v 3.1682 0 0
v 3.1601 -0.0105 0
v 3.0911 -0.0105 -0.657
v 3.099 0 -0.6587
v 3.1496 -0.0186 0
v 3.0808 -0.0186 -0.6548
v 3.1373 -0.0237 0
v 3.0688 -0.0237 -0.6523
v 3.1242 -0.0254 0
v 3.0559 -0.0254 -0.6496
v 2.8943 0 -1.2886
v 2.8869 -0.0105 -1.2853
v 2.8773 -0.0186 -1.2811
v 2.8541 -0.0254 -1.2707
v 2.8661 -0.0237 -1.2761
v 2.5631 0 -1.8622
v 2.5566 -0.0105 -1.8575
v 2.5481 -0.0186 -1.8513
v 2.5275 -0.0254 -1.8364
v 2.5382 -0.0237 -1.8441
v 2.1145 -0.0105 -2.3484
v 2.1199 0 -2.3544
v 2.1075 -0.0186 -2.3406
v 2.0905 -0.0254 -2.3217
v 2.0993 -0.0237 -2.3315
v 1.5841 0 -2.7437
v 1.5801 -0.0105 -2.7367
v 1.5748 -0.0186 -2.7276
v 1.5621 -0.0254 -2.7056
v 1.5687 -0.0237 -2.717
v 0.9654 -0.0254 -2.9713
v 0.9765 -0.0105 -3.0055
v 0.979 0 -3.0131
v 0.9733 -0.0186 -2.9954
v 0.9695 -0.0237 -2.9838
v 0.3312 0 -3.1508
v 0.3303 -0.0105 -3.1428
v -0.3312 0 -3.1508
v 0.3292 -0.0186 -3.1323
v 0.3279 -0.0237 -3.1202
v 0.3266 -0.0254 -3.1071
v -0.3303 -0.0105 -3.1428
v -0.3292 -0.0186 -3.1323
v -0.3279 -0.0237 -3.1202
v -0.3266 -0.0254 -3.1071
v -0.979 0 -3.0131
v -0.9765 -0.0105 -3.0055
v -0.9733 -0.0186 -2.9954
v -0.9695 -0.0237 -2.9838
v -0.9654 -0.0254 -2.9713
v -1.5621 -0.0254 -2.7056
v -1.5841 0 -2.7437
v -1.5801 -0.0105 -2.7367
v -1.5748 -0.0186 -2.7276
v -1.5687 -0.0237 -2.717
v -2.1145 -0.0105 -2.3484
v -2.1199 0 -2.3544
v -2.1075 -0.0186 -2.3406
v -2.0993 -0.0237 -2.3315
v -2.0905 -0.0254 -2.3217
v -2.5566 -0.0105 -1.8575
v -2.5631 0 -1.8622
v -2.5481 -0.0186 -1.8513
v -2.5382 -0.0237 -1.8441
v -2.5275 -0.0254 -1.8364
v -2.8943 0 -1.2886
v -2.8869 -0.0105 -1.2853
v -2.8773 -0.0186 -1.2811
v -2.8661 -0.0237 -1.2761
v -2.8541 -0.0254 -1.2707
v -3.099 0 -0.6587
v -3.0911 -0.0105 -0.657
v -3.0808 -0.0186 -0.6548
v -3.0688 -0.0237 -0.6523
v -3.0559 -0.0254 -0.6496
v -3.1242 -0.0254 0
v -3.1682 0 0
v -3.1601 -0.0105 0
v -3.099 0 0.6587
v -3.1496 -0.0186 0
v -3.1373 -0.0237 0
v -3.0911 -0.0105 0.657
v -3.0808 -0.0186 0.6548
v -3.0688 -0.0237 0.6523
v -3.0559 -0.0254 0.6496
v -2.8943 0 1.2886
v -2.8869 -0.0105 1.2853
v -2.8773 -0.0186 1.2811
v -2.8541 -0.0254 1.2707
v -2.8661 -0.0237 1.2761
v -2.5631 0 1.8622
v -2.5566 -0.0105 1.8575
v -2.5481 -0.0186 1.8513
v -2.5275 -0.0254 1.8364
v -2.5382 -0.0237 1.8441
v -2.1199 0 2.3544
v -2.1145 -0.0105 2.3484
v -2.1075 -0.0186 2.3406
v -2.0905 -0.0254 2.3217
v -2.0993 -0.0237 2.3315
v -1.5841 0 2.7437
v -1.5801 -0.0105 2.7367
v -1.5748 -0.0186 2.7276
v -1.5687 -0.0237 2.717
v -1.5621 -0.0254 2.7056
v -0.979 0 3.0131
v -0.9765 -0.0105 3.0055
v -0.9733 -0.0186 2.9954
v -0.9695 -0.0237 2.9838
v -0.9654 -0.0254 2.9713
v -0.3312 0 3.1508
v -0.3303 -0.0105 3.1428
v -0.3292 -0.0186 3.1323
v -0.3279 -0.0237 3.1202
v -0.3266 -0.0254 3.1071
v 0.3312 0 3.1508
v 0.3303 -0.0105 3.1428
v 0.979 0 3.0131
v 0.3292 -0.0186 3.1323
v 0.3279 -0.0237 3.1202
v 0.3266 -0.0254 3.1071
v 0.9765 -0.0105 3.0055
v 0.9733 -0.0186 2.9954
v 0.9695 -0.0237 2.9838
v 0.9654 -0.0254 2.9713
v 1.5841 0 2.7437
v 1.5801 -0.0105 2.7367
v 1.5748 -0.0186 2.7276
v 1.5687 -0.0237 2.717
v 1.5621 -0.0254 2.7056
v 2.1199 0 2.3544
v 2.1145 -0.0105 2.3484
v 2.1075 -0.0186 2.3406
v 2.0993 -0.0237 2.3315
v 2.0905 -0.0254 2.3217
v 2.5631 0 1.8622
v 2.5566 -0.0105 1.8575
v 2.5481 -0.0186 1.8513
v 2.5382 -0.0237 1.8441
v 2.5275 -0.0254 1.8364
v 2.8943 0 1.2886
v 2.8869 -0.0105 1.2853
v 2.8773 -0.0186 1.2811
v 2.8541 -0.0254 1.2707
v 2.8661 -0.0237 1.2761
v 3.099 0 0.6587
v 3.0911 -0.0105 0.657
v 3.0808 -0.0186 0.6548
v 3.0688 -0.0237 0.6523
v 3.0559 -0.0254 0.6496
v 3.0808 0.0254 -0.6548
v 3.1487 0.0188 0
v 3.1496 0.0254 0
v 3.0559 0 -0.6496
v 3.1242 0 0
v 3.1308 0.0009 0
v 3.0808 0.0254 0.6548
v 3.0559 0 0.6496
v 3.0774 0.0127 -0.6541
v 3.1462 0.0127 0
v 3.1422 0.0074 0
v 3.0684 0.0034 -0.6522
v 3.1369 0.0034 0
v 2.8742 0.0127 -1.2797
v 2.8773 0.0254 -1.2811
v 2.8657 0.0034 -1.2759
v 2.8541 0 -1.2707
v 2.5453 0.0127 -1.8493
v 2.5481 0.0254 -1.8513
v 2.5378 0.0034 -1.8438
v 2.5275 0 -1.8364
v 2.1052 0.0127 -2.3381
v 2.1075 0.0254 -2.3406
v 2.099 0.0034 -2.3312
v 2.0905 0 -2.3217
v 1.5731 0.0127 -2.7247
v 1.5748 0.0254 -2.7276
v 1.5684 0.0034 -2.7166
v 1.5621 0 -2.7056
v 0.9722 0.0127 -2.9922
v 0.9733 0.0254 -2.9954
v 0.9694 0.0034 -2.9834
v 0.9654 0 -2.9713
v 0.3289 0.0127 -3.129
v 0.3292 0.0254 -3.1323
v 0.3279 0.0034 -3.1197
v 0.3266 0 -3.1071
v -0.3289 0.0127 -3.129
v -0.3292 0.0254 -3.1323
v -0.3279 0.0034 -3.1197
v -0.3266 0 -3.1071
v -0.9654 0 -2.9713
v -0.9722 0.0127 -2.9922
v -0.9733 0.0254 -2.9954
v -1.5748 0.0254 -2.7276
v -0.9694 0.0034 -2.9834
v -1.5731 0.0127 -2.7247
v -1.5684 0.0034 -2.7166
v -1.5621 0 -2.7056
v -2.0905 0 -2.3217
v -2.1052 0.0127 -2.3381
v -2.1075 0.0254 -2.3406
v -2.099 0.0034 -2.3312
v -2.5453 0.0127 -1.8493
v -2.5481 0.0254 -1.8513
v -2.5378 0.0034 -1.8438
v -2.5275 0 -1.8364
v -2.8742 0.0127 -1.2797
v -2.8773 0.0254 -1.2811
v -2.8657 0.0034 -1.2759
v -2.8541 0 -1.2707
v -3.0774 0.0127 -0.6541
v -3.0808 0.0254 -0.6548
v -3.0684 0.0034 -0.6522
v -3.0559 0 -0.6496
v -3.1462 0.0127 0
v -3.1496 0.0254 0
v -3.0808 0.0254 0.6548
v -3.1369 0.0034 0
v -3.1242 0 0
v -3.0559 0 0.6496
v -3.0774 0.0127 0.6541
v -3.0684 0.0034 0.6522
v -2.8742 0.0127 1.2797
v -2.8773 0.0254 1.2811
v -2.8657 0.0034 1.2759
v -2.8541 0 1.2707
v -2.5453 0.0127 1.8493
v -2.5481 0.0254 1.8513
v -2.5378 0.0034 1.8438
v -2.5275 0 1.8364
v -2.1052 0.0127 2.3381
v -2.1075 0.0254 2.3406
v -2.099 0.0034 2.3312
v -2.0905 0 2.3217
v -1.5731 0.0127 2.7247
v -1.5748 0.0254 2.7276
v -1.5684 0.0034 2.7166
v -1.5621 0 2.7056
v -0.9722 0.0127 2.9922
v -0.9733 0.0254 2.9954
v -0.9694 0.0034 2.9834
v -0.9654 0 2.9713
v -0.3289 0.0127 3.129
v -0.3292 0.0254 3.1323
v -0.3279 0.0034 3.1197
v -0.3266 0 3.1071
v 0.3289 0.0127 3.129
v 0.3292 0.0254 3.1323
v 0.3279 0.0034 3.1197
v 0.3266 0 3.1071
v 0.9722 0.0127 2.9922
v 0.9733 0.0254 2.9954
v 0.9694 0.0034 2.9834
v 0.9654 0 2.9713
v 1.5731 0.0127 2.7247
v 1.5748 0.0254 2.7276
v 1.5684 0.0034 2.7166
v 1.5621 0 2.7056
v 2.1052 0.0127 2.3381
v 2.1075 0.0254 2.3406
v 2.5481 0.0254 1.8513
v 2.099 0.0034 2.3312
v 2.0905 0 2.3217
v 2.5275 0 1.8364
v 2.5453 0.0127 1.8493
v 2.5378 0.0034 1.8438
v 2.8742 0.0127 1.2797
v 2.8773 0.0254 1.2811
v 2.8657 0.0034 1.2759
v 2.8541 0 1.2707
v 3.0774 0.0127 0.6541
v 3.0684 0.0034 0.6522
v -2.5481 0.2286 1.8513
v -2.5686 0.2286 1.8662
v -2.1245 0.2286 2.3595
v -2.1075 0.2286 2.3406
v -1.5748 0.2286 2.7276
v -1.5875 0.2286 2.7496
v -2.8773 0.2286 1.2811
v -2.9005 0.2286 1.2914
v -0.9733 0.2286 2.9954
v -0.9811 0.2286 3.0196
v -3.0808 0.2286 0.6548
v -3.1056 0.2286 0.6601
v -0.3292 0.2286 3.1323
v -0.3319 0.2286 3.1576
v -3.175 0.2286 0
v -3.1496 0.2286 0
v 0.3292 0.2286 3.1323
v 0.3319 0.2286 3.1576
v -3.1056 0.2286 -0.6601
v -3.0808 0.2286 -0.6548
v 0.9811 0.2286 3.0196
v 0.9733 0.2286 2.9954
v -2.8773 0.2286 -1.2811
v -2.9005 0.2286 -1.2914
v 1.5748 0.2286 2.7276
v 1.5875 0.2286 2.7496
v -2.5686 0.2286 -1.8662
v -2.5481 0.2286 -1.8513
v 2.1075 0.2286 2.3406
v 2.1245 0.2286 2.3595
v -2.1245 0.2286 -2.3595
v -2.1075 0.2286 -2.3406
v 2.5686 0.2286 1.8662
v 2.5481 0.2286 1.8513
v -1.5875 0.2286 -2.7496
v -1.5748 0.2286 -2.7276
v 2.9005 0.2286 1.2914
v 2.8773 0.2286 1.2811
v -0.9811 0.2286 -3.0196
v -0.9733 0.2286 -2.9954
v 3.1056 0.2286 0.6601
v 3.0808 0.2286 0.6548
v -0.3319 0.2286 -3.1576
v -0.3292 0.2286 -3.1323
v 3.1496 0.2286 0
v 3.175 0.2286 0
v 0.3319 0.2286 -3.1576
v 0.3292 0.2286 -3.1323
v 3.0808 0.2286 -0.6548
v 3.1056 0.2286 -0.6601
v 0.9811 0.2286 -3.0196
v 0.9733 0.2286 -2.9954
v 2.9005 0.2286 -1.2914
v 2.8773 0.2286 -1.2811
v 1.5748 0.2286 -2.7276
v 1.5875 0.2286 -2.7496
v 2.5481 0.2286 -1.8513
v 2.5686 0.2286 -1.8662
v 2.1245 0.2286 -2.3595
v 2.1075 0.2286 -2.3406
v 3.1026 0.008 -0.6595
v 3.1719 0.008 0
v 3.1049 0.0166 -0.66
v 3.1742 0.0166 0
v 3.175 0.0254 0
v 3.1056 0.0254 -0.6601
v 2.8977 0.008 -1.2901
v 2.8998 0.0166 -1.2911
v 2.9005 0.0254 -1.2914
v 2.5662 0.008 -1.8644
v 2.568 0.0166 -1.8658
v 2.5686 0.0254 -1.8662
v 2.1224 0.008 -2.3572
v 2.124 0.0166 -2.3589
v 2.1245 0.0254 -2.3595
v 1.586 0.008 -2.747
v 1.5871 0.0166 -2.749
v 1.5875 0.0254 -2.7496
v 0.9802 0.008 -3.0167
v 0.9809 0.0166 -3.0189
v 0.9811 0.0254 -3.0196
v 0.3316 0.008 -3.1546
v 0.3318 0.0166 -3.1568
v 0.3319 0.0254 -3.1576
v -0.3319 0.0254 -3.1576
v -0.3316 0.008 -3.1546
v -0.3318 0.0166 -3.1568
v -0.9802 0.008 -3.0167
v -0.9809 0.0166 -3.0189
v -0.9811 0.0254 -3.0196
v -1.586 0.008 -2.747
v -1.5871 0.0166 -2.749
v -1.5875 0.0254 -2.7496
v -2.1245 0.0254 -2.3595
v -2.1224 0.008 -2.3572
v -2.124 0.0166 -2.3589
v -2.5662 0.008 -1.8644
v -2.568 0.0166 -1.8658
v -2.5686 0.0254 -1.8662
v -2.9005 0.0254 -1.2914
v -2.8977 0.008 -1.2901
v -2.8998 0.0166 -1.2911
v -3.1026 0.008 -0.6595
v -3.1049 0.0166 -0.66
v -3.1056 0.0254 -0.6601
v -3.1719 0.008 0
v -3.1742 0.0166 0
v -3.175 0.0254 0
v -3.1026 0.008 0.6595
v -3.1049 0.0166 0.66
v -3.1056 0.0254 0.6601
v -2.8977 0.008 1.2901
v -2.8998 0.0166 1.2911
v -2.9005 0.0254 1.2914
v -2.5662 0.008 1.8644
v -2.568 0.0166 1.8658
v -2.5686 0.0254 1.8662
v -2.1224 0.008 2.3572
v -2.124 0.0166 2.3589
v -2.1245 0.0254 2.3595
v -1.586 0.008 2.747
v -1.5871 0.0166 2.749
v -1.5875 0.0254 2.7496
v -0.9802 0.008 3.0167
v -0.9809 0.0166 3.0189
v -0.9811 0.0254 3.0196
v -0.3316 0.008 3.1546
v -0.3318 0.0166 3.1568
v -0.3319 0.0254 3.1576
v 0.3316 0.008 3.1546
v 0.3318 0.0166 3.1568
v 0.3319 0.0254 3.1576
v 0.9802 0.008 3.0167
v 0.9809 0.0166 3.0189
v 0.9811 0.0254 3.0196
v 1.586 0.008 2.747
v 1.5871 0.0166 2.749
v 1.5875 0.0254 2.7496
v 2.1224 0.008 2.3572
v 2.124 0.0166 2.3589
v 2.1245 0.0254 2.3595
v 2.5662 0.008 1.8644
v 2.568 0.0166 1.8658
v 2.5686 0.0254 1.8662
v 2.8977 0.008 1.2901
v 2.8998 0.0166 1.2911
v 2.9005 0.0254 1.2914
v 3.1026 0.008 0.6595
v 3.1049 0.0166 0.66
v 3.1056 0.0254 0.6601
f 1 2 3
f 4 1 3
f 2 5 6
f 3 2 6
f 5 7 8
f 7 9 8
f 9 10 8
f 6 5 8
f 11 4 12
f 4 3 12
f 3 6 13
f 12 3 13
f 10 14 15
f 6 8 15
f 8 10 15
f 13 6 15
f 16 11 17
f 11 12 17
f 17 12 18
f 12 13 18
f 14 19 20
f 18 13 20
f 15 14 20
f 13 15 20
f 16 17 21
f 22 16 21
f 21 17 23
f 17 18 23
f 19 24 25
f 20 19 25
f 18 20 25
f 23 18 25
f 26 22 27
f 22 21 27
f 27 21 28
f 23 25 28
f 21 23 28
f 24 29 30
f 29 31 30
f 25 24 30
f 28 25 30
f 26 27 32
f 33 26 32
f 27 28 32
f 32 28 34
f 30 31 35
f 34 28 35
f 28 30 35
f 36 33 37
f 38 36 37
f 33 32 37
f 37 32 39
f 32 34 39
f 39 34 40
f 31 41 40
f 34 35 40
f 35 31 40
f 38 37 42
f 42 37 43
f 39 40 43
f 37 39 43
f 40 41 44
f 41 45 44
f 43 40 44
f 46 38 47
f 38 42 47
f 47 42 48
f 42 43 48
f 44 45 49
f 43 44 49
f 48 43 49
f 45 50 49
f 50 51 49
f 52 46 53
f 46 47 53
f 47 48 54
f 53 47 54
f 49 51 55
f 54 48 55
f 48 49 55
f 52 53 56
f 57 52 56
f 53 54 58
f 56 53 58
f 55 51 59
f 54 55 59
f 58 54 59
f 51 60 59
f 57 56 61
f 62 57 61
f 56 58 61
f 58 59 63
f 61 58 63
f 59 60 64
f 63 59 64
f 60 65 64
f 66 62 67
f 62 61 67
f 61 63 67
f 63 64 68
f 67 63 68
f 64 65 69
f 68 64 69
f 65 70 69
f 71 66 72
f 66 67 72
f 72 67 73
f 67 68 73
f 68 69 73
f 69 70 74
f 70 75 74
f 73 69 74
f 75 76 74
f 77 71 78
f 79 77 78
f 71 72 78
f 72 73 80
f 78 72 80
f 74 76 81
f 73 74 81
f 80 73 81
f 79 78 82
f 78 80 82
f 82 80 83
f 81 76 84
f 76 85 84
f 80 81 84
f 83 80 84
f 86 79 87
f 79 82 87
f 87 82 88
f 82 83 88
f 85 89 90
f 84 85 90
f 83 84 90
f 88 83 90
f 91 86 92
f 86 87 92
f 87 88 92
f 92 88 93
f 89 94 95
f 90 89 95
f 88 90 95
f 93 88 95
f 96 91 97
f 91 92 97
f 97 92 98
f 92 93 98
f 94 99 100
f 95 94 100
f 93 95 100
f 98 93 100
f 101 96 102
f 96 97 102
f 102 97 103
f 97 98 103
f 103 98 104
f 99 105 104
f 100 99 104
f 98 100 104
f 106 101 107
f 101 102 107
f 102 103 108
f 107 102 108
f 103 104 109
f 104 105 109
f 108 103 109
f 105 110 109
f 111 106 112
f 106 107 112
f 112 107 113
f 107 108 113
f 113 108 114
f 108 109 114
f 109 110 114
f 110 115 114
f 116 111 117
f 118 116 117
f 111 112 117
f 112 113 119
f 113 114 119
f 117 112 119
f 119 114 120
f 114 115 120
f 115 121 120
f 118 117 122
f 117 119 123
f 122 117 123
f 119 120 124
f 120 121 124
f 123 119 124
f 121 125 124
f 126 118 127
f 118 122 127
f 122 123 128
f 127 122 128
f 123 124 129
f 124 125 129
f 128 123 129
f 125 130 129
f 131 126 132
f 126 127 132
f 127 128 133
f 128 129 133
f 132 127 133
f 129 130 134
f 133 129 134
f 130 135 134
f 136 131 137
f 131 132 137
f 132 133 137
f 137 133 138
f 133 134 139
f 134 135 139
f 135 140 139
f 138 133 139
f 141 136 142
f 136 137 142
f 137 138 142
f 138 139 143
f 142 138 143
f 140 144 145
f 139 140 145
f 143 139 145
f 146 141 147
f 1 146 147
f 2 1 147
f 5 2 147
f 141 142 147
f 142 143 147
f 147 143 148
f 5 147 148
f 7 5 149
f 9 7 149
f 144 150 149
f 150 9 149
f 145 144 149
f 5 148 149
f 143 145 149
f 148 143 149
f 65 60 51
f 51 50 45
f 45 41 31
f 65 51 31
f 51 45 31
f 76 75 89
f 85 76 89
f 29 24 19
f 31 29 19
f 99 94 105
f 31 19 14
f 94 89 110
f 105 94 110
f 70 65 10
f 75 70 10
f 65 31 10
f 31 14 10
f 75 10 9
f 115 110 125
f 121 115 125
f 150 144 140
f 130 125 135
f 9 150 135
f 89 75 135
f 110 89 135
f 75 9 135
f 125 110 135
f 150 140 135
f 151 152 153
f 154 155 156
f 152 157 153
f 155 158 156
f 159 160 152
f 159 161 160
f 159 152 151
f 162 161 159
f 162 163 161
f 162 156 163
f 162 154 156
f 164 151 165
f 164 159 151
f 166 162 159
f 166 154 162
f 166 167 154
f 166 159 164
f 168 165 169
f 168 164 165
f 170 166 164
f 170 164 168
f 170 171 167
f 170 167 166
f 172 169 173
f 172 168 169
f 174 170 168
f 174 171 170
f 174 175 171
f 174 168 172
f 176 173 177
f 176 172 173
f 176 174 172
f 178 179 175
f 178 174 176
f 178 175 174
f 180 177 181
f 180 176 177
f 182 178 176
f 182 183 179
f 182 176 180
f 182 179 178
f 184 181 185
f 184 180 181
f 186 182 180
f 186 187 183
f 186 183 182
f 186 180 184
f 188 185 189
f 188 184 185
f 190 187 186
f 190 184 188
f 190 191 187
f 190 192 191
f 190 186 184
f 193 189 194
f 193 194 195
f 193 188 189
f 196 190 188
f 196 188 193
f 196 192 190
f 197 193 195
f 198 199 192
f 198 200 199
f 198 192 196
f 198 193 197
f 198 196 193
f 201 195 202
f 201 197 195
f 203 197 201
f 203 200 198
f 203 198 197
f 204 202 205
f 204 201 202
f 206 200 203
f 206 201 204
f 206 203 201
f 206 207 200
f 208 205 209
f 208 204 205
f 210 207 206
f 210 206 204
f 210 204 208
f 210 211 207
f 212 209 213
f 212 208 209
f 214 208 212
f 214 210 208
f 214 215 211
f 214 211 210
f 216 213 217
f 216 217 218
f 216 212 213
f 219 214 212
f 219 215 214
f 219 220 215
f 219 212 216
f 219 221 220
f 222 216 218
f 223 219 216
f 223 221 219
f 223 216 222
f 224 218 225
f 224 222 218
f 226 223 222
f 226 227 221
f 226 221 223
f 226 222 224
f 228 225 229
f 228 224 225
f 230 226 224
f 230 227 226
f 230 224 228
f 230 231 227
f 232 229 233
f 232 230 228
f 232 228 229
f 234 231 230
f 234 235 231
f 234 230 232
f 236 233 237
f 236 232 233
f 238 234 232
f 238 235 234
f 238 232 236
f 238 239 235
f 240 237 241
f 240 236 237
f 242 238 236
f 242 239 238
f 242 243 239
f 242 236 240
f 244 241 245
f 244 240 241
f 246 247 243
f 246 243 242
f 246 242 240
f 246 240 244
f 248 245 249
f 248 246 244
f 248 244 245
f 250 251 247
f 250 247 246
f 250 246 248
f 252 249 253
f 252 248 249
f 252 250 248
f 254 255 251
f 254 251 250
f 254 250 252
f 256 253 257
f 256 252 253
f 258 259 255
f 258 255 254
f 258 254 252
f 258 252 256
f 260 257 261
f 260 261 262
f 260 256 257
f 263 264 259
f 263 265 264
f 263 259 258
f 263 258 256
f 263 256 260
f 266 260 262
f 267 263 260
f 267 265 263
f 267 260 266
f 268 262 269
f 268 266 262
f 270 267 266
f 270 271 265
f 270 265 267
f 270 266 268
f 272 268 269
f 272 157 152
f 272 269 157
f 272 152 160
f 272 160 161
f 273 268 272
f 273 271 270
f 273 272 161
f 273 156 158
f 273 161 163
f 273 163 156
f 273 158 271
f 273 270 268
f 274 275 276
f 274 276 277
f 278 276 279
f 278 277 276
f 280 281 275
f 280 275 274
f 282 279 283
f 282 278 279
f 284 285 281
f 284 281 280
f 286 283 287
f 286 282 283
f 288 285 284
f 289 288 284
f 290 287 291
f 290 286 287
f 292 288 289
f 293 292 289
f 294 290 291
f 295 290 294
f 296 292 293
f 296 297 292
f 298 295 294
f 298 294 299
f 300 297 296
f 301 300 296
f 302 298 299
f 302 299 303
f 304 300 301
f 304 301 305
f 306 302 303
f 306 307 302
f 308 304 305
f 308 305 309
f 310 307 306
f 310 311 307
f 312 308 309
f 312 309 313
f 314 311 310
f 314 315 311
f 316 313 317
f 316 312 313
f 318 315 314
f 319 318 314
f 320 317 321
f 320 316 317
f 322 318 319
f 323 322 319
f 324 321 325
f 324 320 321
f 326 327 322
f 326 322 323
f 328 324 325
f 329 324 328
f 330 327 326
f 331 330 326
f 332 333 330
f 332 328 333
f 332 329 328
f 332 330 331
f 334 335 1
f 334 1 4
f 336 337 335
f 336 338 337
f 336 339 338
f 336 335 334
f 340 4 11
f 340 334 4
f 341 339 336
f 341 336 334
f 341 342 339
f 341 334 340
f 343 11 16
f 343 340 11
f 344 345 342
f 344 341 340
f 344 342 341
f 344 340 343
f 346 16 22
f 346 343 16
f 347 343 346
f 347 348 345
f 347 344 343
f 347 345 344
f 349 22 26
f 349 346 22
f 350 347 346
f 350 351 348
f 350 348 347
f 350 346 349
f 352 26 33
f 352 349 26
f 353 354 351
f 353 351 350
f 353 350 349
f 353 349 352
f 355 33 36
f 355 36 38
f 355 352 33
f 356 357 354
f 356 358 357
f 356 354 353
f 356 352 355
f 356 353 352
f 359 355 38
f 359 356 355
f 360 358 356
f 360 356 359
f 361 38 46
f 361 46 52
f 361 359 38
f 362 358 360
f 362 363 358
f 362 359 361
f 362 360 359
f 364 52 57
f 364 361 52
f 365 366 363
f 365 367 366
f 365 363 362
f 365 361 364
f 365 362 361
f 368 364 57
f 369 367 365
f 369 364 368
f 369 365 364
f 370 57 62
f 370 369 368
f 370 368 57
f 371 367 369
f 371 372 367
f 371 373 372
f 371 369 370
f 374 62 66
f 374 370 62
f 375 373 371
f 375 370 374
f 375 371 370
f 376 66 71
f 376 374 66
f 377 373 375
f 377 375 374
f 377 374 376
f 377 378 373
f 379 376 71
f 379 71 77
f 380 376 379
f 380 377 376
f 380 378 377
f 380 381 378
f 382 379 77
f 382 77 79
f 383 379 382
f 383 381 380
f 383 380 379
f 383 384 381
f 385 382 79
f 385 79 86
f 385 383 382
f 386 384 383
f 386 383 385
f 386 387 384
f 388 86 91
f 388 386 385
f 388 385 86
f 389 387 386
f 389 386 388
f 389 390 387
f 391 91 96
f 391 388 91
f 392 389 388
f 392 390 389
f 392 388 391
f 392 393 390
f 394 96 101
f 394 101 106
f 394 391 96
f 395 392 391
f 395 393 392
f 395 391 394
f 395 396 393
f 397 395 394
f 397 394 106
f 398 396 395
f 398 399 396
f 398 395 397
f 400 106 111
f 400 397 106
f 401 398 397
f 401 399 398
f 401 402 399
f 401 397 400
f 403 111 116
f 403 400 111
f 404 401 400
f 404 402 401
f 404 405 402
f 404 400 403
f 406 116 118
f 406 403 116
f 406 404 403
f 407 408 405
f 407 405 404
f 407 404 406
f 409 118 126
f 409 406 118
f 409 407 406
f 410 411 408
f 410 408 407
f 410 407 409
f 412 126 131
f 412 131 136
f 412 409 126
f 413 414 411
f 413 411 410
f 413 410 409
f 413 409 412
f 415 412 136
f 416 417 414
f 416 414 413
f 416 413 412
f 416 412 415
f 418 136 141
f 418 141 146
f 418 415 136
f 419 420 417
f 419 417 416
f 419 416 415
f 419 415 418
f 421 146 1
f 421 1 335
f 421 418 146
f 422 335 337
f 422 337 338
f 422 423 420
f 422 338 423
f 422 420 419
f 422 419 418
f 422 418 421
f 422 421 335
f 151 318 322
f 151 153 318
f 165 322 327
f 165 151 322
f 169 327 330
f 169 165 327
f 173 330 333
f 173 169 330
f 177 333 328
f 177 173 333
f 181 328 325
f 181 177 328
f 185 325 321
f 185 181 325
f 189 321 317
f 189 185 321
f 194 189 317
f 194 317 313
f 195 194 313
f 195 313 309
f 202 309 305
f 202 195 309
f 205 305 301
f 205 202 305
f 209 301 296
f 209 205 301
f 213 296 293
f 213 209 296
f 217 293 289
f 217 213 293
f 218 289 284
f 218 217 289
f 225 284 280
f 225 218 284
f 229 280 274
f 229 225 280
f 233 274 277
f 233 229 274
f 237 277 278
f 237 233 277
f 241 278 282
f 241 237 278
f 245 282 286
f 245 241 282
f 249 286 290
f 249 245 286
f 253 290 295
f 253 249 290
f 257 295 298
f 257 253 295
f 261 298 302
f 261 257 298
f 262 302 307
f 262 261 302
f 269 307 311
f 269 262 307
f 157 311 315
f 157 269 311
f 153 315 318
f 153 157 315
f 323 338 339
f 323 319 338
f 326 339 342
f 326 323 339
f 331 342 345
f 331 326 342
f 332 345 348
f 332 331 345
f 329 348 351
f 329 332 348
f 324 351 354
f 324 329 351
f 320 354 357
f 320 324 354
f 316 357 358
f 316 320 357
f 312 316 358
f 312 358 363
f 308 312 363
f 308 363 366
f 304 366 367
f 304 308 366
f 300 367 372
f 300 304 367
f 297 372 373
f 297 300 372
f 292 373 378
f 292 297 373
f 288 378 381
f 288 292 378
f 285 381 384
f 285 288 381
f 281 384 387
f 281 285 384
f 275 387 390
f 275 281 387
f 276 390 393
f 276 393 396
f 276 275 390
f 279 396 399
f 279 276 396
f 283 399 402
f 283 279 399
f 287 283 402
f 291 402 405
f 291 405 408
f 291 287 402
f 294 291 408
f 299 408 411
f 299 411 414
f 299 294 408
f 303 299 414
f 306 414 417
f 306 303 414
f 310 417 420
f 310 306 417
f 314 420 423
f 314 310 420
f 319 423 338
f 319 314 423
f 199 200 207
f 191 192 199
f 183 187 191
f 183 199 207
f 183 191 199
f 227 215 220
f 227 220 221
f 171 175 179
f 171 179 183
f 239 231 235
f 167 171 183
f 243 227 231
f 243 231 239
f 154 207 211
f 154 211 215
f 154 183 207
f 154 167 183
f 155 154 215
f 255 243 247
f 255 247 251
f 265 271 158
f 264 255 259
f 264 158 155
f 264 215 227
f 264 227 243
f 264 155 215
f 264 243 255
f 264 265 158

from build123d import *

# Parameters (mm, degrees)
SKETCH1_R          = 3.175
BASE_FLANGE1_DEPTH = 0.0254


# Read off the part's stored shape, not the designer's step: Edge-Flange1
# Sheet-metal steps are written as plain solids
with BuildPart() as part:
    # Sketch1 → Base-Flange1 (new body)
    with BuildSketch(Plane(origin=(0, 0, 0), x_dir=(1, 0, 0), z_dir=(0, 1, 0))):
        with Locations(Location((0, 0, 0), (0, 0, 270))):
            Circle(SKETCH1_R)
    extrude(amount=-BASE_FLANGE1_DEPTH)

    # Edge-Flange1 outline → Edge-Flange1 (revolve, cut)
    with BuildSketch(Plane.XY):
        with BuildLine():
            Line((3.175, 0), (3.16819409, 0))
            ThreePointArc((3.16819409, 0), (3.149599999, -0.01859409), (3.1242, -0.0254))
            Line((3.1242, -0.0254), (3.175, -0.0254))
            Line((3.175, -0.0254), (3.175, 0))
        make_face()
    revolve(axis=Axis((0, 0, 0), (0, 1, 0)), mode=Mode.SUBTRACT)

    # Edge-Flange1 2 outline → Edge-Flange1 2 (revolve)
    with BuildSketch(Plane.XY):
        with BuildLine():
            Line((3.175, 0.2286), (3.1496, 0.2286))
            Line((3.1496, 0.2286), (3.1496, 0.0254))
            ThreePointArc((3.1496, 0.0254), (3.142160512, 0.007439488), (3.1242, 0))
            Line((3.1242, 0), (3.16819409, 0))
            ThreePointArc((3.16819409, 0), (3.173269032, 0.012251992), (3.175, 0.0254))
            Line((3.175, 0.0254), (3.175, 0.2286))
        make_face()
    revolve(axis=Axis((0, 0, 0), (0, 1, 0)))


solid = part.part
